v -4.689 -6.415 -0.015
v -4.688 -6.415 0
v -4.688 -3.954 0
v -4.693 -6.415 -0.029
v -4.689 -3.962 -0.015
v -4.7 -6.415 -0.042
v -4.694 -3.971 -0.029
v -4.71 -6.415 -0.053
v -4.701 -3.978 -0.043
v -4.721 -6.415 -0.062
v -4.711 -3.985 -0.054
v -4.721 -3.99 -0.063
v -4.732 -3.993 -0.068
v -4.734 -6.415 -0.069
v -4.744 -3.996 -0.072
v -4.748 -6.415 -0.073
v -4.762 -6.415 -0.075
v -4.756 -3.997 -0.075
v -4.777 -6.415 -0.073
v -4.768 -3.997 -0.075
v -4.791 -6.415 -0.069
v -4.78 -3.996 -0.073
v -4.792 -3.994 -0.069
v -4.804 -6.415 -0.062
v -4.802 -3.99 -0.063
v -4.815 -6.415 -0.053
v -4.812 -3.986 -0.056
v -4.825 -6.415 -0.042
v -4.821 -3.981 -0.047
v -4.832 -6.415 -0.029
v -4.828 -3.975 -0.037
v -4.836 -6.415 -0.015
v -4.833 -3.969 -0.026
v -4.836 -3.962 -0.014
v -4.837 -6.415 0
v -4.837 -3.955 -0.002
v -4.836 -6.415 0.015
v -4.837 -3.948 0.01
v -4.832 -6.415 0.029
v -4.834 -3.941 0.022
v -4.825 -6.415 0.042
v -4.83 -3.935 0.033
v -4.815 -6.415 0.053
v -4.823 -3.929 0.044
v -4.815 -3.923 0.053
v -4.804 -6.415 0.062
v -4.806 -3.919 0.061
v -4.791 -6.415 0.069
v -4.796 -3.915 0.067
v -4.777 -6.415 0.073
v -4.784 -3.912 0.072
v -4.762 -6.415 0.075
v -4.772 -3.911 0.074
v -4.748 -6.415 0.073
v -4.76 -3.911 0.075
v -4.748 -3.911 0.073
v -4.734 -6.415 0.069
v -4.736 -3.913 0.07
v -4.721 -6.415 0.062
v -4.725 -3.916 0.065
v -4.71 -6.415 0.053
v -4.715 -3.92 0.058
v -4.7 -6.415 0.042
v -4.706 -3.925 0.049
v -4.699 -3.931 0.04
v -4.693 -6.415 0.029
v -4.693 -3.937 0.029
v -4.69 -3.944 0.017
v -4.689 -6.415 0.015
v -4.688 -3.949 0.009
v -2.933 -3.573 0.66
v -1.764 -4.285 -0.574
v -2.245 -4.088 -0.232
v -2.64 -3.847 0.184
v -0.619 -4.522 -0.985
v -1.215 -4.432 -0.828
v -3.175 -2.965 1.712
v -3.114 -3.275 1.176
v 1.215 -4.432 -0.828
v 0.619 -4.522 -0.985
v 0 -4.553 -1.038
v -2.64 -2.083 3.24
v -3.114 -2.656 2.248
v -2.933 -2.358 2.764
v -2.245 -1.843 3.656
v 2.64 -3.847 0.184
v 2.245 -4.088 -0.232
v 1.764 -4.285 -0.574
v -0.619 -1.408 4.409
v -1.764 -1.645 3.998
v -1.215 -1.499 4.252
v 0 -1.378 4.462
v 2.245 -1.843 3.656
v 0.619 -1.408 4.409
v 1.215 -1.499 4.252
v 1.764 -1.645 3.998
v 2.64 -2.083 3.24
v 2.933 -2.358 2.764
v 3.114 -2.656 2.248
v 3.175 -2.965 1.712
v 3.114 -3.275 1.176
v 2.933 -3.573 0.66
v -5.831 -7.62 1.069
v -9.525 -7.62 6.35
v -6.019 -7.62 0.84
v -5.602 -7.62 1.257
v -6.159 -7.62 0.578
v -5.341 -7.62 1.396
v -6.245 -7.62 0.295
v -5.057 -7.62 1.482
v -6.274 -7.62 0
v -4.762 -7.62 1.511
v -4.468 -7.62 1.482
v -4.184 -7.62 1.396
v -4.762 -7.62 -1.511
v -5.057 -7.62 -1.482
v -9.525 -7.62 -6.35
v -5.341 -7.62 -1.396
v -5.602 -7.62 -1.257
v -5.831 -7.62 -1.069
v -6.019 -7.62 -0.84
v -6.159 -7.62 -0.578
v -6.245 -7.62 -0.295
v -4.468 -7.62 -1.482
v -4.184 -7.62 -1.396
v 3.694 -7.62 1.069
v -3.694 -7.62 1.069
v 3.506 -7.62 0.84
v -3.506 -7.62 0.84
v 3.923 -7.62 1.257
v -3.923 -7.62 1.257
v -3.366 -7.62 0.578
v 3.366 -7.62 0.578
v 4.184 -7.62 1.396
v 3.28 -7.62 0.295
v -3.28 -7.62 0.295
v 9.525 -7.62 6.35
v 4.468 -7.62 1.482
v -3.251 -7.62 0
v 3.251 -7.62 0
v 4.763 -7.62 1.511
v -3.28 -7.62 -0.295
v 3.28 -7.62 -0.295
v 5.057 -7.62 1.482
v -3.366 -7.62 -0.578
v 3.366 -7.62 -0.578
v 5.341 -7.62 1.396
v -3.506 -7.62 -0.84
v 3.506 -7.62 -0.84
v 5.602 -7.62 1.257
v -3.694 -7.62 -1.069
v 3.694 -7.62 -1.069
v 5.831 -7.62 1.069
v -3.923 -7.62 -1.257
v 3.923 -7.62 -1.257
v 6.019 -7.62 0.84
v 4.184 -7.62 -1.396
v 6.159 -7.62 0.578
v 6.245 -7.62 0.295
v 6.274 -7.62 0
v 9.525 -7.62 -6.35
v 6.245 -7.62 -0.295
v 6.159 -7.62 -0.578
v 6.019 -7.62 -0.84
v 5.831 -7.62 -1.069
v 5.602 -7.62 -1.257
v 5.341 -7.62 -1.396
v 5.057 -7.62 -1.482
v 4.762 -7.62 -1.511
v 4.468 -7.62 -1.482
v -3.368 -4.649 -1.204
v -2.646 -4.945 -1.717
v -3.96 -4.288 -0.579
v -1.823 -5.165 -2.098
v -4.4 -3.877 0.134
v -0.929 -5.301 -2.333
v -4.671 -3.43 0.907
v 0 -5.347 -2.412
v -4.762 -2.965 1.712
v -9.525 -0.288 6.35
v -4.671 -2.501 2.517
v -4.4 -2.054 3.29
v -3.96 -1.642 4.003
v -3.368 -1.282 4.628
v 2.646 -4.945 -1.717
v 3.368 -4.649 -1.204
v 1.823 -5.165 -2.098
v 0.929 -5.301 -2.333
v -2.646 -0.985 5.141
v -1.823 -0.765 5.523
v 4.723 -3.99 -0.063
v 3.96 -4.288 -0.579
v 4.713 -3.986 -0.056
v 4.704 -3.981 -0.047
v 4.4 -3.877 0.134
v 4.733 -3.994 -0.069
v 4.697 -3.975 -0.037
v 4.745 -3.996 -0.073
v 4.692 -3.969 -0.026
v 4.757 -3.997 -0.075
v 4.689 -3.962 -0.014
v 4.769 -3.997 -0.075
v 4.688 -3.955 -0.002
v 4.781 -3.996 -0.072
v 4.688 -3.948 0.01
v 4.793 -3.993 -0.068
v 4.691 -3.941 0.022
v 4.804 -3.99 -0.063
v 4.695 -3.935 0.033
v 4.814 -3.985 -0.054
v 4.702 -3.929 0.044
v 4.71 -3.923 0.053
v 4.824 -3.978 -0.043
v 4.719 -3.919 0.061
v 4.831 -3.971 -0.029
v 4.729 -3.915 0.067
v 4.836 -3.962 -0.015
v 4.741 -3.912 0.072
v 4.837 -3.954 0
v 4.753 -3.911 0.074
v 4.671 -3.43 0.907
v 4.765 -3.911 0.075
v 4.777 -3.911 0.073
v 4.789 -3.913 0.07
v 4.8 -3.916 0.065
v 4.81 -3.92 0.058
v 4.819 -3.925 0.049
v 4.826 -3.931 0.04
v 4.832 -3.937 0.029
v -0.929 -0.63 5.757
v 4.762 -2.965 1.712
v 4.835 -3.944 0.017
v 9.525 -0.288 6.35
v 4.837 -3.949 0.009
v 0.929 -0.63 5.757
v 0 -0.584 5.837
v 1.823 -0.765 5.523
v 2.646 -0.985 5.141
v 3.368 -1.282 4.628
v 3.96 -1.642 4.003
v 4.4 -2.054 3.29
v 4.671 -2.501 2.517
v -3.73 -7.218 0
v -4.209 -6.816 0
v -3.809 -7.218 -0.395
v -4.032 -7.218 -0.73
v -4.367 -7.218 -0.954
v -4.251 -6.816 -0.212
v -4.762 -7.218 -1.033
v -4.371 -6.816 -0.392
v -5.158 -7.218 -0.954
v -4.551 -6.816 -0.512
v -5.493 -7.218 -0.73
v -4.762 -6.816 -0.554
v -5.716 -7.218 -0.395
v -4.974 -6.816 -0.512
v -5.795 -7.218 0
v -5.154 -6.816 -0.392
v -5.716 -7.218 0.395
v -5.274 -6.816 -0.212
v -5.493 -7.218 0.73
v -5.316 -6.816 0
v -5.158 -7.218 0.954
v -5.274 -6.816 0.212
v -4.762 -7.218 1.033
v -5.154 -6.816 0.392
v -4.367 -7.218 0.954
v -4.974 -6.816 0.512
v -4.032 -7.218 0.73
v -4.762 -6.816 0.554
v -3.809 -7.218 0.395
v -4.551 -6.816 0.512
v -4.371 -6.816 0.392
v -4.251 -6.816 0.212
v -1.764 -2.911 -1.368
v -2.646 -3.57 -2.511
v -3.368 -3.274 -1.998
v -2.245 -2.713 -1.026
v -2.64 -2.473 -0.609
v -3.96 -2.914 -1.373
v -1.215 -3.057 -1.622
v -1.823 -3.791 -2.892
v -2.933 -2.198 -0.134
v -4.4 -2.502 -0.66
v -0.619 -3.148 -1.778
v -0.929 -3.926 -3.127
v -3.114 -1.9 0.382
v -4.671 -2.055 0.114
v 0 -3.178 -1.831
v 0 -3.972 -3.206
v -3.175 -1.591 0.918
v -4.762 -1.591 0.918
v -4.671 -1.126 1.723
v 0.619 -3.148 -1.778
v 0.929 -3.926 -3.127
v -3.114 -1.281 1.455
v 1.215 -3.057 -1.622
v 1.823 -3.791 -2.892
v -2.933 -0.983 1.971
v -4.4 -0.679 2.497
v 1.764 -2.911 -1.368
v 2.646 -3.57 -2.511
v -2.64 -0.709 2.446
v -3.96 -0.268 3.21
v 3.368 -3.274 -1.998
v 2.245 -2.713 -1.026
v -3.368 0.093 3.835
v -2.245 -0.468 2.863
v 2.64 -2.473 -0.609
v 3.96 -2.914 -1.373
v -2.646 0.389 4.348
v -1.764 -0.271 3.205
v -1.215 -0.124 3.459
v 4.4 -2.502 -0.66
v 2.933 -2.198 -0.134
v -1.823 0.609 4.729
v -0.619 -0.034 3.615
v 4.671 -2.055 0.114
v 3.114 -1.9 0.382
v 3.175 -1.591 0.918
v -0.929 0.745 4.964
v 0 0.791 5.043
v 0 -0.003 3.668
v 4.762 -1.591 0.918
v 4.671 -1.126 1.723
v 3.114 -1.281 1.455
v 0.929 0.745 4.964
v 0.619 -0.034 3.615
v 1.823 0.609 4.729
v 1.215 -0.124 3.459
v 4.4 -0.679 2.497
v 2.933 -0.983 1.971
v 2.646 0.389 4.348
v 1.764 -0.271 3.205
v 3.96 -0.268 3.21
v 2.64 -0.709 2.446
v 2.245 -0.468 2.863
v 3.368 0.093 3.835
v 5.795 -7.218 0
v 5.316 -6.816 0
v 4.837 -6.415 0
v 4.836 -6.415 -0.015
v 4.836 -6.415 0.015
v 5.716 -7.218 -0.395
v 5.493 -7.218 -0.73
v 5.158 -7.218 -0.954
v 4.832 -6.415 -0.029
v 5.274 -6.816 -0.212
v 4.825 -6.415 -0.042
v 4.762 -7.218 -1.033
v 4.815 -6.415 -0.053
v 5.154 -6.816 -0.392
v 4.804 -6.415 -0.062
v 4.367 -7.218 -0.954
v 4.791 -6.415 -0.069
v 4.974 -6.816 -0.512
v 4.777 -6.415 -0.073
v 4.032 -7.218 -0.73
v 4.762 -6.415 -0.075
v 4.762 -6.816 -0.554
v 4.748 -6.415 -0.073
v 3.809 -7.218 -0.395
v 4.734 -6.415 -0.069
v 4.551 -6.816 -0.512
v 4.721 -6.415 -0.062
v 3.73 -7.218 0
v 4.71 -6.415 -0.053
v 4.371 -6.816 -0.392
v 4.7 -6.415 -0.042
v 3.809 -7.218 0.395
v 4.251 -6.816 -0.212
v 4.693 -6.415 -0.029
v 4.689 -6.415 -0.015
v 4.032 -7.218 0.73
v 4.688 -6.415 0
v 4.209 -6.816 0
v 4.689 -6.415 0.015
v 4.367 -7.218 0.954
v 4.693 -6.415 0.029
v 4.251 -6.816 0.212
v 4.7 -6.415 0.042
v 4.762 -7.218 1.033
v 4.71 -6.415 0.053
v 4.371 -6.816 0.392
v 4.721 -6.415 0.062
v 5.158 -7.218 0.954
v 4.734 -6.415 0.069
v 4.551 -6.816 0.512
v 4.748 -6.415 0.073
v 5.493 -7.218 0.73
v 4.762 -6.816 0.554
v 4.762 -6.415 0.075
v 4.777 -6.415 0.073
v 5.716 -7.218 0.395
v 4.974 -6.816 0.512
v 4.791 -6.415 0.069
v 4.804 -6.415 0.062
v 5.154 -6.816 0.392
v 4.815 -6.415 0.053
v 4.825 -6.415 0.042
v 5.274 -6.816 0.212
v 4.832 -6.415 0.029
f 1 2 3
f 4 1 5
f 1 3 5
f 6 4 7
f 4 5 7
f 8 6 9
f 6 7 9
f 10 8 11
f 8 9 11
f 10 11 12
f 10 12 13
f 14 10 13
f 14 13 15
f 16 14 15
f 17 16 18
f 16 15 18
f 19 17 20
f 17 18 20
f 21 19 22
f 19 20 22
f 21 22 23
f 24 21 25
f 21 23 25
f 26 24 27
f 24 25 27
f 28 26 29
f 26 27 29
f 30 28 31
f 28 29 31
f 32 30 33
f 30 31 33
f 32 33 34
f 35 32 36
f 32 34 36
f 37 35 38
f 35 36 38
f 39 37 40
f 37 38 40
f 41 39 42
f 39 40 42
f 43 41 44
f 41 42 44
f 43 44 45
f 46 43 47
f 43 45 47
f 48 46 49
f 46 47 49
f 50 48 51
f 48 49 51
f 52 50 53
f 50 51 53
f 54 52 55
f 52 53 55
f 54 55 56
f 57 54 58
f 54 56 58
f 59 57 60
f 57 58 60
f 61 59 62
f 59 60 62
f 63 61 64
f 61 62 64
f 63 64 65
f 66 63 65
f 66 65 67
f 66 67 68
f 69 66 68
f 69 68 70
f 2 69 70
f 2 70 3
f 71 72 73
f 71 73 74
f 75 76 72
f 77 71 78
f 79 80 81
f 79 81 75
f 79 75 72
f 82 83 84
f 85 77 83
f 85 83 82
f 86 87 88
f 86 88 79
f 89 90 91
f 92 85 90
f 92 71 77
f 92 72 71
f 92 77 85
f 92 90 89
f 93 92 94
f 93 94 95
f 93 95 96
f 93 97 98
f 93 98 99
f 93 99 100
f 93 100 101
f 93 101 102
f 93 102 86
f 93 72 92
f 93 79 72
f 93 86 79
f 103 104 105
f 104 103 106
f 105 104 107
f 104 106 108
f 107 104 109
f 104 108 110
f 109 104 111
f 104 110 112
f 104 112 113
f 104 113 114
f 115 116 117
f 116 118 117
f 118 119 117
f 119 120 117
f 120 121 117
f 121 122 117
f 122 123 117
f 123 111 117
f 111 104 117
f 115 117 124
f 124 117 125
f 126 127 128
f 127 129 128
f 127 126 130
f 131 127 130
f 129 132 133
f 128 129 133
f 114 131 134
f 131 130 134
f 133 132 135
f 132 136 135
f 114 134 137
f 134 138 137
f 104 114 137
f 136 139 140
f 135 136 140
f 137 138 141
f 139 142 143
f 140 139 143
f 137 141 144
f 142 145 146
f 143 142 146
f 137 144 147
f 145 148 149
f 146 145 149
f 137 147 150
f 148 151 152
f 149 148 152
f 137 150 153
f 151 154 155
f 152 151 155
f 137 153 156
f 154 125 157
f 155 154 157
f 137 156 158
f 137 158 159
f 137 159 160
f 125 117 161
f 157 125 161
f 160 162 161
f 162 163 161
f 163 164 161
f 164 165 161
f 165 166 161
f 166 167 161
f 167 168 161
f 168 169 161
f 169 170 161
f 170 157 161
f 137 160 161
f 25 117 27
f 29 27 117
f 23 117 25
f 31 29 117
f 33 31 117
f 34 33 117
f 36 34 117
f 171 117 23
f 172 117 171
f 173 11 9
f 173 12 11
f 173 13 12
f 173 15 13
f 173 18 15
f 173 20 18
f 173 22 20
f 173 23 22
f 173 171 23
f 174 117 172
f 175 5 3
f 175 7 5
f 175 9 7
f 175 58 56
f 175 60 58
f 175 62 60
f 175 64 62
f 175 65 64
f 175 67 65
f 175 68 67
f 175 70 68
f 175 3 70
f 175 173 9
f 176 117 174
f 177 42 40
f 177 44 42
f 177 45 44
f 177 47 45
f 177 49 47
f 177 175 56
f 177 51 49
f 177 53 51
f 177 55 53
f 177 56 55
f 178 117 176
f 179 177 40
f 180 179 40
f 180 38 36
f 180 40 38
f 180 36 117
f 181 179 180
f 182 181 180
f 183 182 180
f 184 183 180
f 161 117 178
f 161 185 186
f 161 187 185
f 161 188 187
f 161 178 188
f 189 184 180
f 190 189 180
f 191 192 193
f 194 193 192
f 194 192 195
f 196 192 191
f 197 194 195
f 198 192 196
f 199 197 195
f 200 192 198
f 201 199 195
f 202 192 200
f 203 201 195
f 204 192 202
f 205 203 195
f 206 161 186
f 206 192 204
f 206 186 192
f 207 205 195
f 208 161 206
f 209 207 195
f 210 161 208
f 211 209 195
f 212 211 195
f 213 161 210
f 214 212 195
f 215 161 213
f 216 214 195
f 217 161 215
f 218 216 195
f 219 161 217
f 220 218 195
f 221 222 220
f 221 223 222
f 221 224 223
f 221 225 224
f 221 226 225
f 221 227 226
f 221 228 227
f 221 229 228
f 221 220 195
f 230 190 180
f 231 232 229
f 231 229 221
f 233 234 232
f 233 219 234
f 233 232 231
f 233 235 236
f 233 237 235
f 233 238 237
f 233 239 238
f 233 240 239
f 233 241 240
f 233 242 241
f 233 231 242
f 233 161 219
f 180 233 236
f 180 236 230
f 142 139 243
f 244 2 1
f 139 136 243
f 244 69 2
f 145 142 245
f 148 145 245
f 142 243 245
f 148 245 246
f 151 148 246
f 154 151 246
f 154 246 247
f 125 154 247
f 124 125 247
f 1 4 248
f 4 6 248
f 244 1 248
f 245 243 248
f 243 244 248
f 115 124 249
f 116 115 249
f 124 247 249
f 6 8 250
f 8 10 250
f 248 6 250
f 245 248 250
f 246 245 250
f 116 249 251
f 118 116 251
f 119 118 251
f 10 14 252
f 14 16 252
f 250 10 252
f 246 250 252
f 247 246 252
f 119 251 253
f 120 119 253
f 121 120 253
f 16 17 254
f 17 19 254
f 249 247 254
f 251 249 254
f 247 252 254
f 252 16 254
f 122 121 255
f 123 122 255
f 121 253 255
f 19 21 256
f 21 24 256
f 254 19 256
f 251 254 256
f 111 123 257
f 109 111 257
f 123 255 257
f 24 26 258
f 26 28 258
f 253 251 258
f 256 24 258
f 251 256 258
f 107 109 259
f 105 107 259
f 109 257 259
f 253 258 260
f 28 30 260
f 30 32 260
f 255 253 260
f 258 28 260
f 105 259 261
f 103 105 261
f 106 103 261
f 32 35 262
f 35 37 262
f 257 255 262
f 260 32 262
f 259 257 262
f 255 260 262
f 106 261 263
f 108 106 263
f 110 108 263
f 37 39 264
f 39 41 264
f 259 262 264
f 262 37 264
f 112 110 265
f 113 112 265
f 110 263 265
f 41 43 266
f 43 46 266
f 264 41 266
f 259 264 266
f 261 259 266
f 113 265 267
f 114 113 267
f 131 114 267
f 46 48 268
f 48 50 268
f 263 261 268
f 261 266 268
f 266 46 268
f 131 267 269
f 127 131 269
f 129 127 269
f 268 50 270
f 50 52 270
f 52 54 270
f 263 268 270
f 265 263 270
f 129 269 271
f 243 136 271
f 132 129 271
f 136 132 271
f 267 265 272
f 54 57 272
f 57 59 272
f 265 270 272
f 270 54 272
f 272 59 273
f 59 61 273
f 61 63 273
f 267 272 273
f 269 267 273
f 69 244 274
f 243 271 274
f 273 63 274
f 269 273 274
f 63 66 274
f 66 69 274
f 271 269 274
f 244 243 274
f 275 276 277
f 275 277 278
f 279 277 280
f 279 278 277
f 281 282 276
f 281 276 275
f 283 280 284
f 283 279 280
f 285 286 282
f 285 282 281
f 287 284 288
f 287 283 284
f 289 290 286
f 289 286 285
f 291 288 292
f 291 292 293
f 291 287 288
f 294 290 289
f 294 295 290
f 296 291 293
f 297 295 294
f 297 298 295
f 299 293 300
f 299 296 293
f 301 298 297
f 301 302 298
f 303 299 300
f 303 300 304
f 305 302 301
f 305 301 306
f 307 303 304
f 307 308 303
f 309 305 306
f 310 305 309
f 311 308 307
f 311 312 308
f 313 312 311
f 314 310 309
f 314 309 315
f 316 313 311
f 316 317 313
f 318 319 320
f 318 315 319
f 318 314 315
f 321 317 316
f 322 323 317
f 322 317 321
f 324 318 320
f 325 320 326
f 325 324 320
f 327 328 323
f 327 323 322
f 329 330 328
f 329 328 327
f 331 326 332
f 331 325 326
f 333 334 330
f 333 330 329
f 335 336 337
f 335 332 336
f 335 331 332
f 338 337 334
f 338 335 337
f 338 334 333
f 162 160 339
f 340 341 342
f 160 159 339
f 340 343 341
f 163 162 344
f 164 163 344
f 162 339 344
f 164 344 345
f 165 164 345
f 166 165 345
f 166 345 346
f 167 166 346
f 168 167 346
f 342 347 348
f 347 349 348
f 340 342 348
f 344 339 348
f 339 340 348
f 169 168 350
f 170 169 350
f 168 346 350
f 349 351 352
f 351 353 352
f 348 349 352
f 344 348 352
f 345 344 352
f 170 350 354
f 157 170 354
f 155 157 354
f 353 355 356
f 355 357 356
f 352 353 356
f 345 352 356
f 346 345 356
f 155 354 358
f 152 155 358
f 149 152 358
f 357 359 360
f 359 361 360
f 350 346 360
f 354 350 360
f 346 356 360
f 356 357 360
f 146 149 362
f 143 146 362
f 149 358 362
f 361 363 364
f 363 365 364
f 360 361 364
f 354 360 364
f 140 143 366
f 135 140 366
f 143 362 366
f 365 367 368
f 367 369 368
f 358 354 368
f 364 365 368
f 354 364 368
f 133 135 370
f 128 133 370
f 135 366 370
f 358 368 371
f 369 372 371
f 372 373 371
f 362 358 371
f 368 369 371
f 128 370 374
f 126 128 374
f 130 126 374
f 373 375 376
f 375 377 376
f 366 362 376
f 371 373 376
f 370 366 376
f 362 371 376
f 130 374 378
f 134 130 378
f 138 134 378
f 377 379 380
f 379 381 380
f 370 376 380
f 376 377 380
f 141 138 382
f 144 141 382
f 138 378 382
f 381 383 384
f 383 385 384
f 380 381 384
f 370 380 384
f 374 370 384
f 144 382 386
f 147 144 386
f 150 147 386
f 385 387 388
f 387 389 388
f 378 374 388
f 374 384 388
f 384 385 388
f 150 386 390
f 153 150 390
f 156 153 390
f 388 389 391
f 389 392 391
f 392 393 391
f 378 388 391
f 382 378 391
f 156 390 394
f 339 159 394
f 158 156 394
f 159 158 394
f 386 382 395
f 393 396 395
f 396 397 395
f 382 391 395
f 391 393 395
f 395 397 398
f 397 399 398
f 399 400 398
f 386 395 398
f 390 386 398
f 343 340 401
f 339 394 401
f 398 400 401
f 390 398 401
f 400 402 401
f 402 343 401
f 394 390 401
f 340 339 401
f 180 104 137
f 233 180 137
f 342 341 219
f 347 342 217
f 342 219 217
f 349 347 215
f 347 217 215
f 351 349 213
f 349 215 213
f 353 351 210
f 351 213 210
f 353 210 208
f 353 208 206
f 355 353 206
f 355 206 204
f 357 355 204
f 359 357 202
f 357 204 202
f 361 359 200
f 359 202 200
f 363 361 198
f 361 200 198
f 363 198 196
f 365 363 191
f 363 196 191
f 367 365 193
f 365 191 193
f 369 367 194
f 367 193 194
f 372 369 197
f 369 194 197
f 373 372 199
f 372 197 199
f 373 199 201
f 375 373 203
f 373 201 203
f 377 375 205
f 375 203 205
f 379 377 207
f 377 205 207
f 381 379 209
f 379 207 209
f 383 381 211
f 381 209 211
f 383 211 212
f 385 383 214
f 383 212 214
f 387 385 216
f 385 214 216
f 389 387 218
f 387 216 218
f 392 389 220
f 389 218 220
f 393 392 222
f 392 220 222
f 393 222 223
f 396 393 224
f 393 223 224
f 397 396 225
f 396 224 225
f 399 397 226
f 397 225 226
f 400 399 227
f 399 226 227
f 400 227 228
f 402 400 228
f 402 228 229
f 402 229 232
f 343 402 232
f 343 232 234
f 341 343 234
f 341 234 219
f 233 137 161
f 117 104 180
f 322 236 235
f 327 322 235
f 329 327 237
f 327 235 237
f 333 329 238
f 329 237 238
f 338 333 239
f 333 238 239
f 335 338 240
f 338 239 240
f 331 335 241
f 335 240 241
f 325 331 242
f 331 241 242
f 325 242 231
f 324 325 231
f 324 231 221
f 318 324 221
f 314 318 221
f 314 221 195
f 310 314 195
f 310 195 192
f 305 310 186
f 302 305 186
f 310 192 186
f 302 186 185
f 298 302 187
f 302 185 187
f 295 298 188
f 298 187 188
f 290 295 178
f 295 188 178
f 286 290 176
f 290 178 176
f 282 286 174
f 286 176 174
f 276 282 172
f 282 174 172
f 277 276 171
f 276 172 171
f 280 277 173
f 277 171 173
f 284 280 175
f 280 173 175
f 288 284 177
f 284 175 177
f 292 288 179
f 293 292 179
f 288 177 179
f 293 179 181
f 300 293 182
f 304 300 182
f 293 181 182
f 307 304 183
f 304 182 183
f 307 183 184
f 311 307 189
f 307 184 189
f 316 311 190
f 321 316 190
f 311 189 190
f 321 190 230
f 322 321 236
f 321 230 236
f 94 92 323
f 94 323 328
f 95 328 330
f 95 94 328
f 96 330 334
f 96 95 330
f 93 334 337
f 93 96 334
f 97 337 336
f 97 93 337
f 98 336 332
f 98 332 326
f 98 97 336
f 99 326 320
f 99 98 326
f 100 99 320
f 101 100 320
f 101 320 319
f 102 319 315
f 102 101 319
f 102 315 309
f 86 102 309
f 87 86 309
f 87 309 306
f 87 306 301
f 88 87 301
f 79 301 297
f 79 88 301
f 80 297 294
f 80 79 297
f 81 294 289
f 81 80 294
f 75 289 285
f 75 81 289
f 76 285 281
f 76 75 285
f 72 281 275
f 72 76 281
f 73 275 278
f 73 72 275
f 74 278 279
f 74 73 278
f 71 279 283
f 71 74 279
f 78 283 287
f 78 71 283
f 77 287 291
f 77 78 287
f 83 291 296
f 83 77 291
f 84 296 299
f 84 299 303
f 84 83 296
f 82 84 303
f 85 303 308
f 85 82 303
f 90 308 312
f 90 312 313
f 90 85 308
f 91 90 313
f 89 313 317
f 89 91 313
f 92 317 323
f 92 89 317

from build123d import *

# Parameters (mm, degrees)
SKETCH9_W                              = 19.05
SKETCH9_H                              = 12.7
BOSS_EXTRUDE1_DEPTH                    = 25.4
CUT_EXTRUDE1_DEPTH                     = 27.820764344
SKETCH11_R                             = 4.7625
SKETCH11_R_2                           = 3.175
BOSS_EXTRUDE2_DEPTH                    = 1.5875
F_97_0_0059_DIAMETER_HOLE1_D           = 0.14986
F_97_0_0059_DIAMETER_HOLE1_CSINK_D     = 3.0226
F_97_0_0059_DIAMETER_HOLE1_CSINK_ANGLE = 100


with BuildPart() as part:
    # Sketch9 → Boss-Extrude1 (new body)
    with BuildSketch(Plane(origin=(0, -7.62, 0), x_dir=(1, 0, 0), z_dir=(0, 1, 0))):
        Rectangle(SKETCH9_W, SKETCH9_H)
    extrude(amount=BOSS_EXTRUDE1_DEPTH)

    # Sketch10 → Cut-Extrude1 (cut, through all)
    with BuildSketch(Plane(origin=(9.525, 0, 0), x_dir=(0, 0, -1), z_dir=(1, 0, 0))):
        Polygon((6.35, -7.62), (-6.35, -0.287651581), (-6.35, 22.86), (6.35, 22.86), align=None)
    extrude(amount=-CUT_EXTRUDE1_DEPTH, mode=Mode.SUBTRACT)

    # Sketch11 → Boss-Extrude2 (add)
    with BuildSketch(Plane(origin=(0, -2.965369343, 1.712056788), x_dir=(1, 0, 0), z_dir=(0, 0.8660254037844382, -0.500000000000001))):
        with Locations(Location((0, 0, 0), (0, 0, 270))):
            Circle(SKETCH11_R)
        with Locations(Location((0, 0, 0), (0, 0, 270))):
            Circle(SKETCH11_R_2, mode=Mode.SUBTRACT)
    extrude(amount=BOSS_EXTRUDE2_DEPTH)

    # #97 (0.0059) Diameter Hole1 (through all)
    with Locations(Plane(origin=(0, -7.62, 0), x_dir=(-1, 0, 0), z_dir=(0, -1, 0))):
        with Locations((4.7625, 0), (-4.7625, 0)):
            CounterSinkHole(F_97_0_0059_DIAMETER_HOLE1_D / 2, F_97_0_0059_DIAMETER_HOLE1_CSINK_D / 2, counter_sink_angle=F_97_0_0059_DIAMETER_HOLE1_CSINK_ANGLE)


solid = part.part
